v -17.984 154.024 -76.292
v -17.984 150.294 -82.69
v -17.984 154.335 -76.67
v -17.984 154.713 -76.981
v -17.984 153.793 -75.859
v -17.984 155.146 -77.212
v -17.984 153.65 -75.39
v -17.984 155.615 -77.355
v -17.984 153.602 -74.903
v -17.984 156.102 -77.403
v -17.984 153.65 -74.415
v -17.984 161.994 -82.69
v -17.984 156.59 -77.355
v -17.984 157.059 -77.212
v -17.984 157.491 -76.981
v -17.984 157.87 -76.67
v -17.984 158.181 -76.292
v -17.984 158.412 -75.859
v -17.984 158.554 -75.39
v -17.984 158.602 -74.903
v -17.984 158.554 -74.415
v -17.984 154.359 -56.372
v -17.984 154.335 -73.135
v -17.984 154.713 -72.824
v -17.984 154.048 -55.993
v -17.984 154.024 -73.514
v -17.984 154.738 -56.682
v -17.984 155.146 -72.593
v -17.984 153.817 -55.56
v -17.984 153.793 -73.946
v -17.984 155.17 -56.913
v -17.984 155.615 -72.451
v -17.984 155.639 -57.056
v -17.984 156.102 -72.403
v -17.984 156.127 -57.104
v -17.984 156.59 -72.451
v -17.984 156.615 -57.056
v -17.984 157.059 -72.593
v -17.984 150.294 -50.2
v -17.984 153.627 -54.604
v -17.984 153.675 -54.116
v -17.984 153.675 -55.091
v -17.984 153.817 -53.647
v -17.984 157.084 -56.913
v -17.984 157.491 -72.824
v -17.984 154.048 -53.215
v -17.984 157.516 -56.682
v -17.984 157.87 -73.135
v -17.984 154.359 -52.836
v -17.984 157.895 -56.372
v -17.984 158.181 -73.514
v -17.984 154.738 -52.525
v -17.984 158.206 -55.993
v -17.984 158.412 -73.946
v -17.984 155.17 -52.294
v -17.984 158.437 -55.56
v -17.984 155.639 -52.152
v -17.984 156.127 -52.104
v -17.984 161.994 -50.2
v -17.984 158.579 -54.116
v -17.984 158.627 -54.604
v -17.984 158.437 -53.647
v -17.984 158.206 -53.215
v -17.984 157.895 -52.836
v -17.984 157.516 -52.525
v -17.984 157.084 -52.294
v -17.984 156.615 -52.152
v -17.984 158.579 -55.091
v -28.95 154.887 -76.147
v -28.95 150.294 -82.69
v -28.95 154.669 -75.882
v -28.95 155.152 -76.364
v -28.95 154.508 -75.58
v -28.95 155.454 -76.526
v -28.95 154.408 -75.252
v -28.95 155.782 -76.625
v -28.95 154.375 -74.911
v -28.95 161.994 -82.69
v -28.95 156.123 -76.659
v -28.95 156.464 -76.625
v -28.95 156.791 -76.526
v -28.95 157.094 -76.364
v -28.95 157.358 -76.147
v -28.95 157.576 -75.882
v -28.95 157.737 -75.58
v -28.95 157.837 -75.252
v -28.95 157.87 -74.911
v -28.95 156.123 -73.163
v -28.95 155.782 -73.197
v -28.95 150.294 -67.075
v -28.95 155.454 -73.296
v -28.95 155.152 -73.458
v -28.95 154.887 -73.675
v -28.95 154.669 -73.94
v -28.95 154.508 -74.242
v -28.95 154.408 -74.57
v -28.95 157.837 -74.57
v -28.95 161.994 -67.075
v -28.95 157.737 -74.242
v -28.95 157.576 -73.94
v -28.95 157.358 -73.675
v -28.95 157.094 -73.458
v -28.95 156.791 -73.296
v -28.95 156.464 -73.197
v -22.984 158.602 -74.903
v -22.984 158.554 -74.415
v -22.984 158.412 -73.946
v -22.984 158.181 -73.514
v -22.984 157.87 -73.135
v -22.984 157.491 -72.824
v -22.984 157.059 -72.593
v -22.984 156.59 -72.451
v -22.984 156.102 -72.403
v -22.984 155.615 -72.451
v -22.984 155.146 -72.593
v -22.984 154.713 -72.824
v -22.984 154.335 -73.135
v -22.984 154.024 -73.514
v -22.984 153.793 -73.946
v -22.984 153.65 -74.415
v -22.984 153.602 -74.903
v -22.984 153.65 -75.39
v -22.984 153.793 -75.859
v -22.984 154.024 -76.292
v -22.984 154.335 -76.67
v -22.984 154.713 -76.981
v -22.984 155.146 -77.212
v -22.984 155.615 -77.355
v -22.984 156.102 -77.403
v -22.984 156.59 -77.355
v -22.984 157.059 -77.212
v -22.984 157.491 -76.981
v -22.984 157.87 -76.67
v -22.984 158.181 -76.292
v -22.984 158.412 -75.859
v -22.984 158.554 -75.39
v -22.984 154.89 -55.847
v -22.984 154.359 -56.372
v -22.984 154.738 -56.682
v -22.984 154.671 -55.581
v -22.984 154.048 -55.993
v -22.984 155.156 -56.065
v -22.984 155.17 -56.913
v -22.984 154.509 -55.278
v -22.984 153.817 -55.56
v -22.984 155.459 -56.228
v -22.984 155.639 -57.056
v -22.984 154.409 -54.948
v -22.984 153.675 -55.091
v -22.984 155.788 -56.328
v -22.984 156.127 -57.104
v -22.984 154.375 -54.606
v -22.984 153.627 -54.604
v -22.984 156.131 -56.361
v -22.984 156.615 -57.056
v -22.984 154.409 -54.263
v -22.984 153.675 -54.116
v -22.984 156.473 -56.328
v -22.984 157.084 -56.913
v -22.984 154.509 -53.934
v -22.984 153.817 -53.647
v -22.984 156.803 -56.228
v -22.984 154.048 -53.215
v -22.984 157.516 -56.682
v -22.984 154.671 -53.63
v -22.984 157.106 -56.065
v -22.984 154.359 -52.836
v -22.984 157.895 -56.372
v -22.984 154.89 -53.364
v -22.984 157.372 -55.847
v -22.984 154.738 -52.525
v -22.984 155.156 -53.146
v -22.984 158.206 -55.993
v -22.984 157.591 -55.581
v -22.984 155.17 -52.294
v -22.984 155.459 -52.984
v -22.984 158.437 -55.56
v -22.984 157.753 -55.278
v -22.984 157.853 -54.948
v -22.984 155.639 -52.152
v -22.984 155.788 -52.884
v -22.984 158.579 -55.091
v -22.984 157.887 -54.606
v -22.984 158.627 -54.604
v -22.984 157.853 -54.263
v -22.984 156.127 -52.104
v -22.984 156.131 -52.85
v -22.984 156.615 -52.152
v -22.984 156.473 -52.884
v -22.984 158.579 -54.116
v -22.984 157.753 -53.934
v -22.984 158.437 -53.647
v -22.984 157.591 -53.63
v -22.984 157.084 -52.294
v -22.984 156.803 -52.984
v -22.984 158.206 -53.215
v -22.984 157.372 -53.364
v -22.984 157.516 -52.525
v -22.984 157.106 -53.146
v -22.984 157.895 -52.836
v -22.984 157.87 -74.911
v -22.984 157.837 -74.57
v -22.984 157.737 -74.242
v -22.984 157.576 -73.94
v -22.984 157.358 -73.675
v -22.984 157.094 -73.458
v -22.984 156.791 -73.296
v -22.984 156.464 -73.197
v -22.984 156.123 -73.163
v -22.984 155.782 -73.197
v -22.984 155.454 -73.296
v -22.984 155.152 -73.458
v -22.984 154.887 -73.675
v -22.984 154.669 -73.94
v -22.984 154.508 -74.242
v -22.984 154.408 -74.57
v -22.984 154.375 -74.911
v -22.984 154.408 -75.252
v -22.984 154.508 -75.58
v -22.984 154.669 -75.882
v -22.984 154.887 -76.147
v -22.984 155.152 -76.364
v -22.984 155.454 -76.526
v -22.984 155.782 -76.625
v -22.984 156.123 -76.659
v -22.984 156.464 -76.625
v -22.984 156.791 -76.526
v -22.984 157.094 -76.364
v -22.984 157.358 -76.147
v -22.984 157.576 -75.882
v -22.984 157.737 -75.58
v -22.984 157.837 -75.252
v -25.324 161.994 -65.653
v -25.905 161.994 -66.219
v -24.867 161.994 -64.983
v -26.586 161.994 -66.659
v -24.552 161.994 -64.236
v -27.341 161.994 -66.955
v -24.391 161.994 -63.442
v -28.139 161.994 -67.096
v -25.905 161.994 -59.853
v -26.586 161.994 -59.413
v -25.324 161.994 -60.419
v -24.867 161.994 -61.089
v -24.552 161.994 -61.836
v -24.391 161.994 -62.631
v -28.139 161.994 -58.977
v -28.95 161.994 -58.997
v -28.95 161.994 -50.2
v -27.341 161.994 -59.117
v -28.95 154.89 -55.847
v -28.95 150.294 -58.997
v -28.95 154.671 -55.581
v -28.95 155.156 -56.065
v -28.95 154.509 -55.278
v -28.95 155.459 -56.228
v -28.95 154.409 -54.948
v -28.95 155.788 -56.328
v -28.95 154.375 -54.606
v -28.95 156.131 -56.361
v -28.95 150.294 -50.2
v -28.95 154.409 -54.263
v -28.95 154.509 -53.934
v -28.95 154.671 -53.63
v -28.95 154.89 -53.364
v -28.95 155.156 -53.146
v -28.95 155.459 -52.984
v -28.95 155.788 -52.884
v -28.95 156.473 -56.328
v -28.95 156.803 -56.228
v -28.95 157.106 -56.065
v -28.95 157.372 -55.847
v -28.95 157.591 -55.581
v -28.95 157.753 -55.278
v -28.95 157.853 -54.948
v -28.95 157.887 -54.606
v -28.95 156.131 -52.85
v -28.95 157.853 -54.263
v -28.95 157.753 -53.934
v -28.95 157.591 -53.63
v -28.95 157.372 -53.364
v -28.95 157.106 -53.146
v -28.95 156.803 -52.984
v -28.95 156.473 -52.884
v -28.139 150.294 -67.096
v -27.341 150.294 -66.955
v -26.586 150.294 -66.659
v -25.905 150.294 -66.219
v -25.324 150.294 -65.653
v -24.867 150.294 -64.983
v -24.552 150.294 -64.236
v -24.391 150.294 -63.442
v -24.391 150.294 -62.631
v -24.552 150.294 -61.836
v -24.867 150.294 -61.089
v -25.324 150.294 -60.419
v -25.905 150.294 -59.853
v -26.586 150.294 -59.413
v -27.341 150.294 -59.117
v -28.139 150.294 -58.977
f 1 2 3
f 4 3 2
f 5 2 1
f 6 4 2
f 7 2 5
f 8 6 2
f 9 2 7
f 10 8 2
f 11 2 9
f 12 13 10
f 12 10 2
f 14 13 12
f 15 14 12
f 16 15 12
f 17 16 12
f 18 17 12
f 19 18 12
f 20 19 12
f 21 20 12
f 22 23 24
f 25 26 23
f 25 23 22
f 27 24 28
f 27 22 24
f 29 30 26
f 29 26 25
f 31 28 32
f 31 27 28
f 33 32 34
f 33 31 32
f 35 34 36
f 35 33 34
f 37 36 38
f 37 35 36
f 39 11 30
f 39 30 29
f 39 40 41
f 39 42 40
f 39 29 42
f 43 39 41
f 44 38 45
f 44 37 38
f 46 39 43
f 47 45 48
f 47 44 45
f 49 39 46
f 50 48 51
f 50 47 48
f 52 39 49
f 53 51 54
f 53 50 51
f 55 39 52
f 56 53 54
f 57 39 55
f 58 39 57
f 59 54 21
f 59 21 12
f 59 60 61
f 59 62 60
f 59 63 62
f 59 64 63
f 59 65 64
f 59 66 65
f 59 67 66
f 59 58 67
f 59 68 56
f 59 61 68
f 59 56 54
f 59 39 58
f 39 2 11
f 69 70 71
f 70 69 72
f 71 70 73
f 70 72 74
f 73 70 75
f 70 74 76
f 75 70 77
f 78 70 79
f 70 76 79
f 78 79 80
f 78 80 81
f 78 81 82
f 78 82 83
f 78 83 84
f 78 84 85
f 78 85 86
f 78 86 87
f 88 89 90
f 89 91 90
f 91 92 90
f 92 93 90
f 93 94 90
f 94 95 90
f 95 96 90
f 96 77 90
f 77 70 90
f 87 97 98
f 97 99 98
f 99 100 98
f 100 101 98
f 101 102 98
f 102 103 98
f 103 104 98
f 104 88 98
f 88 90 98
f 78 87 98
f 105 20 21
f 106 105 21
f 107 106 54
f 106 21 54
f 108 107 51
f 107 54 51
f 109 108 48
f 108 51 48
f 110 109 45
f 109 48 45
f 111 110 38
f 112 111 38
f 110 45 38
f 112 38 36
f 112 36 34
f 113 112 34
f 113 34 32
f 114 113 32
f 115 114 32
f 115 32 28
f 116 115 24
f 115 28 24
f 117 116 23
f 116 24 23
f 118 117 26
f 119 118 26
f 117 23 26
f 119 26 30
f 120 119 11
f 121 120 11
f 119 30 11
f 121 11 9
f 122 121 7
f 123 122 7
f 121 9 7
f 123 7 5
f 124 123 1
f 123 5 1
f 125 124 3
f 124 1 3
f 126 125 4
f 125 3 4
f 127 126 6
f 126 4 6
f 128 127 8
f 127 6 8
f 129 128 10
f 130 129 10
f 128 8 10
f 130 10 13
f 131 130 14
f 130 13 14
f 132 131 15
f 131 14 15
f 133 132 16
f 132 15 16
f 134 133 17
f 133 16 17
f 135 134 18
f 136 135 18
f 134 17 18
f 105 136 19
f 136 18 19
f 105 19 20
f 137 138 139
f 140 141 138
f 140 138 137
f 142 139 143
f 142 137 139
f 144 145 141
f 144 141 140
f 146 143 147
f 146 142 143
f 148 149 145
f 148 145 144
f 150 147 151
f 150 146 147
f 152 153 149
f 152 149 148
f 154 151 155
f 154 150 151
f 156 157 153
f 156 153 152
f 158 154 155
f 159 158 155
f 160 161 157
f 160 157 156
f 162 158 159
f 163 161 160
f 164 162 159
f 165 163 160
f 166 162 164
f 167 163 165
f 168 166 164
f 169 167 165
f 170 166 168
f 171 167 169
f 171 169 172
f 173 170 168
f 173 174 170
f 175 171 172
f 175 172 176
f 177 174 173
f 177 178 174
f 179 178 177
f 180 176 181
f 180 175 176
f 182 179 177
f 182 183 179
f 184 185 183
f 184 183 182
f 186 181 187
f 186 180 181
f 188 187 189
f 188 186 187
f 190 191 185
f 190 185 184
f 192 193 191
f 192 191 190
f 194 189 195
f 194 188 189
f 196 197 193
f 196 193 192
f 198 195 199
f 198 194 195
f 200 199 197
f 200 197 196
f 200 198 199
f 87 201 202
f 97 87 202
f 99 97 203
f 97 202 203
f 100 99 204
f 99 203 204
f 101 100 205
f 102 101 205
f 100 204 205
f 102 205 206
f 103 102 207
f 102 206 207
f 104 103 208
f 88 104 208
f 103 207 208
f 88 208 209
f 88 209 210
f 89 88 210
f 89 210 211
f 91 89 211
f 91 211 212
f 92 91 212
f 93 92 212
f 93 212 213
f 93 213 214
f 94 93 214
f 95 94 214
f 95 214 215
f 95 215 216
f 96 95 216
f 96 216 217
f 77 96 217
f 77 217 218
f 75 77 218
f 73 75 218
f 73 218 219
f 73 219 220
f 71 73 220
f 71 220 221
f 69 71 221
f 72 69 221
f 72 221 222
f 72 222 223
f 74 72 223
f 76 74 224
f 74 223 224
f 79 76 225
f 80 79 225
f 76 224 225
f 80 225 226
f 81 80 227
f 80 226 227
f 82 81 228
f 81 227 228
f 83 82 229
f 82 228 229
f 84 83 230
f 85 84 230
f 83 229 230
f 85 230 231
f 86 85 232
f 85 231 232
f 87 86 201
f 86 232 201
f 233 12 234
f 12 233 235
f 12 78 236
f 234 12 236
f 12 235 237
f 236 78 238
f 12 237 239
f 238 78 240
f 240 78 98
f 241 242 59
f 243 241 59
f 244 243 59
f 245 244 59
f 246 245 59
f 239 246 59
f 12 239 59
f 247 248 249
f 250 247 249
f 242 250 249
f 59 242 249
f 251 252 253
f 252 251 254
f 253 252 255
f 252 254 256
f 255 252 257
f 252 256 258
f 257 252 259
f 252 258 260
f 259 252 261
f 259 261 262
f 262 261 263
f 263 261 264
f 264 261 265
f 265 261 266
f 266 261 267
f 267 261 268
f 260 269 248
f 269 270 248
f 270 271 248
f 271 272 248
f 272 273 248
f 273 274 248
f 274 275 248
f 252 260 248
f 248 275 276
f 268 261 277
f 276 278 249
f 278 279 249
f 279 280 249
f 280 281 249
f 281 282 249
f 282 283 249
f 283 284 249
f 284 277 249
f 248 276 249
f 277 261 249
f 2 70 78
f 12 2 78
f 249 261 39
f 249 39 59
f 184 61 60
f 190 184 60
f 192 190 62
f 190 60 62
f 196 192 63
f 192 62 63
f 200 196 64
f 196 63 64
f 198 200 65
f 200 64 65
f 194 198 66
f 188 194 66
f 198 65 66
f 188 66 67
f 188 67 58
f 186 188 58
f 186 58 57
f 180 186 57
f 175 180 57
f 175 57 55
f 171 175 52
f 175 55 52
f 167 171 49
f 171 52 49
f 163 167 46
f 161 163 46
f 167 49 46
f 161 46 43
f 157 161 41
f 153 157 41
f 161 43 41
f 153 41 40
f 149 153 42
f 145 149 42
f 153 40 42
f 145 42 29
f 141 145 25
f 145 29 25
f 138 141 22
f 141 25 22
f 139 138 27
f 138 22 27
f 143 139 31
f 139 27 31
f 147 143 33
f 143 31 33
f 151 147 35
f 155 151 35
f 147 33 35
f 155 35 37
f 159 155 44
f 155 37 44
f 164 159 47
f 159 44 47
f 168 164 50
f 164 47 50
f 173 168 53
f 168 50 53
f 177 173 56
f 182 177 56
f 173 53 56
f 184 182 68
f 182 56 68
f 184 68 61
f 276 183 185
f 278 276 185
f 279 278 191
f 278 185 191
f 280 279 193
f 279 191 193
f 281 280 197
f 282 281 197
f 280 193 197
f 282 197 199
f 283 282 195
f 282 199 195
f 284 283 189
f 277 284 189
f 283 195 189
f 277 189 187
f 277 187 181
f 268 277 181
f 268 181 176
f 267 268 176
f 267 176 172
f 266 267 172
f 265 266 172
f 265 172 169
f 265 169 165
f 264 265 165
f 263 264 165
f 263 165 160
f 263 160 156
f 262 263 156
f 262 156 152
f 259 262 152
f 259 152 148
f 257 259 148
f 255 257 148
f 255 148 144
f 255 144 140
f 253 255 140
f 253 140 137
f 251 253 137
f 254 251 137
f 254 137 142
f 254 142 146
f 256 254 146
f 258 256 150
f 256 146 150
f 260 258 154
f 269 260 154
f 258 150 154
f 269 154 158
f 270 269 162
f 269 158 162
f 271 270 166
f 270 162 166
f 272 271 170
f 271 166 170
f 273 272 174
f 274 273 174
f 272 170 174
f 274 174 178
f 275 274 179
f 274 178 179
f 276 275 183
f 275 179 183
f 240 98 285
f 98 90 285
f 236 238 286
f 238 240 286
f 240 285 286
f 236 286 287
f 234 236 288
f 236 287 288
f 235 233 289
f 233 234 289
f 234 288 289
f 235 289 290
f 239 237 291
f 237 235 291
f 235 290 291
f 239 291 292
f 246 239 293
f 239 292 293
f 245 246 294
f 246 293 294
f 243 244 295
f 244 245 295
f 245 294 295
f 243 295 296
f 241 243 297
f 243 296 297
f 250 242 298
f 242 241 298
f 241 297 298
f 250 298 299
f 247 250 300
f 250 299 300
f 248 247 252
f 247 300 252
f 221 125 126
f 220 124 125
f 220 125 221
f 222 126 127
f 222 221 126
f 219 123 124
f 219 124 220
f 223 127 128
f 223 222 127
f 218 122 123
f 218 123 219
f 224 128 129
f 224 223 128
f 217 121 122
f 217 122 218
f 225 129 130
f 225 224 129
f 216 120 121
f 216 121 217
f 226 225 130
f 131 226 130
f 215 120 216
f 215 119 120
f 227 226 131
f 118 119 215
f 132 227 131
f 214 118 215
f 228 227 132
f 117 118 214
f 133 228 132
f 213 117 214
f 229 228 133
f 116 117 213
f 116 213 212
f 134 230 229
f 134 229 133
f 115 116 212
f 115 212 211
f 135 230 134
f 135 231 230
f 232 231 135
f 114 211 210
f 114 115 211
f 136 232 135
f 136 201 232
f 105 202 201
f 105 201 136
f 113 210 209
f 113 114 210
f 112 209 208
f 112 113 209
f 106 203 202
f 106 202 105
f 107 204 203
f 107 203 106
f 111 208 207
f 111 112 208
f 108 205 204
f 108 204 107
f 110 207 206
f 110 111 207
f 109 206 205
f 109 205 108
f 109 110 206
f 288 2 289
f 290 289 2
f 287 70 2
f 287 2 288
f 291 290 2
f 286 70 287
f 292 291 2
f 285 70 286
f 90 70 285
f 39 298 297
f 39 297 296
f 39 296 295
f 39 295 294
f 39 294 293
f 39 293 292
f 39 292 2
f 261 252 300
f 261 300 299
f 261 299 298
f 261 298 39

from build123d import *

# Parameters (mm, degrees)
SKETCH_W        = 11.699997
SKETCH_H        = 32.48951
PAD_DEPTH       = 10.966
SKETCH001_R     = 4.070736
POCKET_DEPTH    = 56
SKETCH002_R     = 1.75554
SKETCH002_R_2   = 1.74777
POCKET001_DEPTH = 71
SKETCH003_R     = 2.5
POCKET002_DEPTH = 5


with BuildPart() as part:
    # Sketch → Pad (new body)
    with BuildSketch(Plane.YZ.offset(-28.95)):
        with Locations((-5.855995, -66.44524)):
            Rectangle(SKETCH_W, SKETCH_H)
    extrude(amount=PAD_DEPTH)

    # Sketch001 (on Face1 of Pad) → Pocket (cut)
    with BuildSketch(Plane(origin=(0, -11.705994, 0), x_dir=(0, 0, -1), z_dir=(0, -1, 0))):
        with Locations((63.03607, -28.441665)):
            Circle(SKETCH001_R)
    extrude(amount=-POCKET_DEPTH, mode=Mode.SUBTRACT)

    # Sketch002 (on Face5 of Pocket) → Pocket001 (cut)
    with BuildSketch(Plane.YZ.offset(-17.984)):
        with Locations((-5.869027, -54.605738)):
            Circle(SKETCH002_R)
        with Locations((-5.877423, -74.910813)):
            Circle(SKETCH002_R_2)
    extrude(amount=-POCKET001_DEPTH, mode=Mode.SUBTRACT)

    # Sketch003 (on Face6 of Pocket001) → Pocket002 (cut)
    with BuildSketch(Plane.YZ.offset(-17.984)):
        with Locations((-5.873042, -54.603773)):
            Circle(SKETCH003_R)
        with Locations((-5.897727, -74.902628)):
            Circle(SKETCH003_R)
    extrude(amount=-POCKET002_DEPTH, mode=Mode.SUBTRACT)


with BuildPart() as part_1:
    # Body placement: moved
    add(part.part.moved(Location((0, 162, 0))))


solid = part_1.part
